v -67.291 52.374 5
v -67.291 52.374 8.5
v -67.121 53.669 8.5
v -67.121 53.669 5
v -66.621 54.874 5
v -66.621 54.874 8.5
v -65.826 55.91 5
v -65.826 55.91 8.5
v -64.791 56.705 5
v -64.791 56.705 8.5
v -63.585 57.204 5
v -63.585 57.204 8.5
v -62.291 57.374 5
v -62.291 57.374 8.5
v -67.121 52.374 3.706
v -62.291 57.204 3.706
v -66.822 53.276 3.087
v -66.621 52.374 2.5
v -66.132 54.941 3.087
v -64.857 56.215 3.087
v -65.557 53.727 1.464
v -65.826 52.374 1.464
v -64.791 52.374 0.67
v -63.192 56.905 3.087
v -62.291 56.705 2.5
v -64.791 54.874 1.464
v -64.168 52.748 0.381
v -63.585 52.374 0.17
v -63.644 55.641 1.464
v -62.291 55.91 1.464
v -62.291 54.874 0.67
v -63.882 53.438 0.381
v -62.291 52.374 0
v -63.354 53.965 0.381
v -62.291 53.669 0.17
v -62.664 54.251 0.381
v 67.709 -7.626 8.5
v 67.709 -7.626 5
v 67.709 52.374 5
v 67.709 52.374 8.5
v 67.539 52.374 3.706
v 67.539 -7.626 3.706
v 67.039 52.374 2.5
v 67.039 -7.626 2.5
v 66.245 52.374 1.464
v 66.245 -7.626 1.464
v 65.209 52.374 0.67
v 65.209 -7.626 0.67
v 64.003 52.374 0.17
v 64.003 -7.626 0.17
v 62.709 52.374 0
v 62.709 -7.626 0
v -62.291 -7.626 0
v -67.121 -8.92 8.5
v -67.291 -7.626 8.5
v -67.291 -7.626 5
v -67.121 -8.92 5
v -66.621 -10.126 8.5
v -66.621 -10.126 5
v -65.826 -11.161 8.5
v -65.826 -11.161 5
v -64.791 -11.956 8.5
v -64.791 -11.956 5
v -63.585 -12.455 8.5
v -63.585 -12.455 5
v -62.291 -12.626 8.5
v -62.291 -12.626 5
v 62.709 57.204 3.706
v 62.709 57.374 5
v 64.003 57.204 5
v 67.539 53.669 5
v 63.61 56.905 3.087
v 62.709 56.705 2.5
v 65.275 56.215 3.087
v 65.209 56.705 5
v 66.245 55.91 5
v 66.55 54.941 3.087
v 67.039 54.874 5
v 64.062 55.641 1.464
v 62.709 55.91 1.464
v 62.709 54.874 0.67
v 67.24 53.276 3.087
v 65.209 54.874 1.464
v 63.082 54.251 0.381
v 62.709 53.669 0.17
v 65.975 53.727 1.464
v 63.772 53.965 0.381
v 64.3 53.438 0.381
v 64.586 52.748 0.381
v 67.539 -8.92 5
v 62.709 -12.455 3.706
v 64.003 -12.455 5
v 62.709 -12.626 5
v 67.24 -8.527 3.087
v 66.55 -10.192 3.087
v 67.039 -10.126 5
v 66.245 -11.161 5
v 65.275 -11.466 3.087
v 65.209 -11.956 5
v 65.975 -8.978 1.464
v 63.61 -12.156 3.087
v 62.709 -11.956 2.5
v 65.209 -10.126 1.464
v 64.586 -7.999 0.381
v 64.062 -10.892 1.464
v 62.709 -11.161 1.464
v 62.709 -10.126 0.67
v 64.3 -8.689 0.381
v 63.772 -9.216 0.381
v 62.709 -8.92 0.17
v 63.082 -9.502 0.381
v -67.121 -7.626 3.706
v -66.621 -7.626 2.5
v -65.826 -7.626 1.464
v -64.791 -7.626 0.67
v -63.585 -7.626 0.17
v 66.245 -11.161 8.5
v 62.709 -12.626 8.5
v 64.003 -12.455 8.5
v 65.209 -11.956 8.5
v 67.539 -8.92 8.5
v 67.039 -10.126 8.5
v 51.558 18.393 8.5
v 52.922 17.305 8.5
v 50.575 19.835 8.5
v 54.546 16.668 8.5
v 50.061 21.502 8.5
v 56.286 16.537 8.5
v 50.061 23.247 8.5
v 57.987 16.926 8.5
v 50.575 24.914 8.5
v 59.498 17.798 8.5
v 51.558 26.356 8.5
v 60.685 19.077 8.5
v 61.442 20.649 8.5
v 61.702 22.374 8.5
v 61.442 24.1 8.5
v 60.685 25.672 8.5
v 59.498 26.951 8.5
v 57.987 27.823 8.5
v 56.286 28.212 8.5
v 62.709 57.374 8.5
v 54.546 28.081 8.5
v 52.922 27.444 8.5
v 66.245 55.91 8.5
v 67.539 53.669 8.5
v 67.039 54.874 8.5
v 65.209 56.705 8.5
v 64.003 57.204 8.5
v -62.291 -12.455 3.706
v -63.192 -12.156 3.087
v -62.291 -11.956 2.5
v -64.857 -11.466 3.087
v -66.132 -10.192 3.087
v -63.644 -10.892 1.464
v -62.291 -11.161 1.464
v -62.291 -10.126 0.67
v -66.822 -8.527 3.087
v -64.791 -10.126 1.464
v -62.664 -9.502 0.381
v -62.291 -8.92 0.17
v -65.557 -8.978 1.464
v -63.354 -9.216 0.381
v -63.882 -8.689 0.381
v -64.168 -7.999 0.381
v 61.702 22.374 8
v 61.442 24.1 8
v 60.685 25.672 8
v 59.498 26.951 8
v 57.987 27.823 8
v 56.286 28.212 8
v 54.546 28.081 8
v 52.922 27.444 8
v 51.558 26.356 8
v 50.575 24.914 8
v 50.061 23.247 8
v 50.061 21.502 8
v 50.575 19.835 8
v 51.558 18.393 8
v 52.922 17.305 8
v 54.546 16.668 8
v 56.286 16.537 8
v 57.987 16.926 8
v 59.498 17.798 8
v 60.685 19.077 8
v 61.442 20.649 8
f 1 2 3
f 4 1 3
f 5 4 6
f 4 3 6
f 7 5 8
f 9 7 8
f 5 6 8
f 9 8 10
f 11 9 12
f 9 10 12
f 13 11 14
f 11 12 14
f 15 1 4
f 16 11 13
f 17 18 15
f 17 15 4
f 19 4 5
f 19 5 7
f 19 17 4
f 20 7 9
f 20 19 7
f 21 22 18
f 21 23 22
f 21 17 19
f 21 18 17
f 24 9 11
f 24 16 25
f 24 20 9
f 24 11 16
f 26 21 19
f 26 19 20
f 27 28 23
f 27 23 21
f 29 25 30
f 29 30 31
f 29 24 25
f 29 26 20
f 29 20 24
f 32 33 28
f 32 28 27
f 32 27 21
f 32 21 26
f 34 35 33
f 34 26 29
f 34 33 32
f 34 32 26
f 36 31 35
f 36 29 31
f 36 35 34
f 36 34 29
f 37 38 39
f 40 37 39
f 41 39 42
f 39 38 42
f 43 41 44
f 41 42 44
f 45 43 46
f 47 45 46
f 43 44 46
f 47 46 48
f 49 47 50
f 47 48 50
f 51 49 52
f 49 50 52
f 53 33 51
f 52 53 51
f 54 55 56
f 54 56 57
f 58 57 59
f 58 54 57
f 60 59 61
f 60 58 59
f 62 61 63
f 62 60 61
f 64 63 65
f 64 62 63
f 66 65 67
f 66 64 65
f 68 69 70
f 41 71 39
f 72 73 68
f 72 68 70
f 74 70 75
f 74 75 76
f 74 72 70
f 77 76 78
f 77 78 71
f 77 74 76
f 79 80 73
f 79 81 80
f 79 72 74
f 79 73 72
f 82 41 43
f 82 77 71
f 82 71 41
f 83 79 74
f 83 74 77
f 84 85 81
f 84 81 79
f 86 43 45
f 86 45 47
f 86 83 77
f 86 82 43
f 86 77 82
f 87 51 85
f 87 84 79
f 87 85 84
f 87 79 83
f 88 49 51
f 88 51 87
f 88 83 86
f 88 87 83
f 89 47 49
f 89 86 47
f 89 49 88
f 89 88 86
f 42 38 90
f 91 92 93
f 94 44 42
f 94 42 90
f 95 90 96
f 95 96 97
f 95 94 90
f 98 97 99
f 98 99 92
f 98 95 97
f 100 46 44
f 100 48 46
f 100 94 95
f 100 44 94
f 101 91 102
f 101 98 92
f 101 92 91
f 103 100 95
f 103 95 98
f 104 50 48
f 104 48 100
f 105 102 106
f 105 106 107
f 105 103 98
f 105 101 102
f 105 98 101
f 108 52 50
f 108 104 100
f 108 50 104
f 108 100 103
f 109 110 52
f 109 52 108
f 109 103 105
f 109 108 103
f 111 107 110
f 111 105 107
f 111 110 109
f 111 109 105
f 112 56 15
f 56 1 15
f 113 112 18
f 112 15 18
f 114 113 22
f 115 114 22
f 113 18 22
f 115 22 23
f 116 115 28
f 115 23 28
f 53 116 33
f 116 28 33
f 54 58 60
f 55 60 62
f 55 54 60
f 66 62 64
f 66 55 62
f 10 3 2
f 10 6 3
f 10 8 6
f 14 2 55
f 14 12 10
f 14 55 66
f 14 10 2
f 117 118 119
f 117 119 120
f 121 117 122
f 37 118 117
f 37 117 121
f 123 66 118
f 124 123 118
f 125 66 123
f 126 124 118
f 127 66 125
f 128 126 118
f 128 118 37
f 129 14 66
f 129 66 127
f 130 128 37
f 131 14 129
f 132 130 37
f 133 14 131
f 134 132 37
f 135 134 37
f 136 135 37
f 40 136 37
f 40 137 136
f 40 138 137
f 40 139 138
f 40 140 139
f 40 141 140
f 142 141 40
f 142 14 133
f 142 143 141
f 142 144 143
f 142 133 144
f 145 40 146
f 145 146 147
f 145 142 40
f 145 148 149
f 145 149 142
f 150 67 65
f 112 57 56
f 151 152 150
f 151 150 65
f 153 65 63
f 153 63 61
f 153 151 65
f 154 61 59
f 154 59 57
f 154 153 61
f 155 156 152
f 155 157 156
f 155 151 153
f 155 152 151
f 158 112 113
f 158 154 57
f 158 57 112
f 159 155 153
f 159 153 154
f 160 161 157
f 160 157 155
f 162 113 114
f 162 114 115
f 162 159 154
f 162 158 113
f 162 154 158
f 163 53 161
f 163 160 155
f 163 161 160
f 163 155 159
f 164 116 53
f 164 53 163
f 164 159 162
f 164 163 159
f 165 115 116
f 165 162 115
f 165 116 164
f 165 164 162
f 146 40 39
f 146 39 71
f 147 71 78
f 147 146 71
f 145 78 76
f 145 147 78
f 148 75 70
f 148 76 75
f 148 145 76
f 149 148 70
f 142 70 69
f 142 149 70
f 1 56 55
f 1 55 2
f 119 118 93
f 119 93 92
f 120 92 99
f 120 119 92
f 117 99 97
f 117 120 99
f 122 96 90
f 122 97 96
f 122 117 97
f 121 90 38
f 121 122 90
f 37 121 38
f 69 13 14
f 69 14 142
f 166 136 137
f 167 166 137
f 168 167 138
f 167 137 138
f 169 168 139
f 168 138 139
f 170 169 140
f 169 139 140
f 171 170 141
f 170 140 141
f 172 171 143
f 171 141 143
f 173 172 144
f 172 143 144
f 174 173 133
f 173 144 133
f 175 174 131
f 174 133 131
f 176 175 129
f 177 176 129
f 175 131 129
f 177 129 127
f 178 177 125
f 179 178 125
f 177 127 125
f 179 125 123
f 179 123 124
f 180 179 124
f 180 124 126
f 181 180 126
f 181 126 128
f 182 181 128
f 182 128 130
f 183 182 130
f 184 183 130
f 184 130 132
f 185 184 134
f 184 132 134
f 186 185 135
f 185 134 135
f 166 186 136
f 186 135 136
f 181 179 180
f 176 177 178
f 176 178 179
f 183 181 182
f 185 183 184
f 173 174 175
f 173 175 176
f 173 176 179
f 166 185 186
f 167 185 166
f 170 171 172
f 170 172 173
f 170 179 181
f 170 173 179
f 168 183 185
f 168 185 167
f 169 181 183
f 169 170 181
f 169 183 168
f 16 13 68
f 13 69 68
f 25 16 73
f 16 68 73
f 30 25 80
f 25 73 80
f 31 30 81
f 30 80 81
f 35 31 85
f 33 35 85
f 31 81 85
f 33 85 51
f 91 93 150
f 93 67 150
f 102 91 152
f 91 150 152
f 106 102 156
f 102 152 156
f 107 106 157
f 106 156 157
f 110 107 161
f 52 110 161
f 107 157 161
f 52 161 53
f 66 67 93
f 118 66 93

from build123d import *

# Parameters (mm, degrees)
F0_W     = 135
F0_H     = 70
F1_DEPTH = 8.5
F2_R     = 5
F3_R     = 5
F4_R     = 5.85347
F5_DEPTH = 0.5


with BuildPart() as f1:
    # F0 (on Top) → F1 (new body)
    with BuildSketch(Plane.XY):
        with Locations((0.209052, 22.374493)):
            Rectangle(F0_W, F0_H)
    extrude(amount=F1_DEPTH)

    # F2
    f2_edges = [f1.edges().sort_by_distance(p)[0] for p in [
        (67.709052, -12.625507, 4.25),
        (67.709052, 57.374493, 4.25),
        (-67.290948, -12.625507, 4.25),
        (-67.290948, 57.374493, 4.25),
    ]]
    fillet(f2_edges, radius=F2_R)

    # F3
    f3_edges = [f1.edges().sort_by_distance(p)[0] for p in [
        (-67.290948, 22.374493, 0),
    ]]
    fillet(f3_edges, radius=F3_R)

    # F4 (on face) → F5 (cut)
    with BuildSketch(Plane.XY.offset(8.5)):
        with Locations((55.848766, 22.374493)):
            Circle(F4_R)
    extrude(amount=-F5_DEPTH, mode=Mode.SUBTRACT)


solid = f1.part
